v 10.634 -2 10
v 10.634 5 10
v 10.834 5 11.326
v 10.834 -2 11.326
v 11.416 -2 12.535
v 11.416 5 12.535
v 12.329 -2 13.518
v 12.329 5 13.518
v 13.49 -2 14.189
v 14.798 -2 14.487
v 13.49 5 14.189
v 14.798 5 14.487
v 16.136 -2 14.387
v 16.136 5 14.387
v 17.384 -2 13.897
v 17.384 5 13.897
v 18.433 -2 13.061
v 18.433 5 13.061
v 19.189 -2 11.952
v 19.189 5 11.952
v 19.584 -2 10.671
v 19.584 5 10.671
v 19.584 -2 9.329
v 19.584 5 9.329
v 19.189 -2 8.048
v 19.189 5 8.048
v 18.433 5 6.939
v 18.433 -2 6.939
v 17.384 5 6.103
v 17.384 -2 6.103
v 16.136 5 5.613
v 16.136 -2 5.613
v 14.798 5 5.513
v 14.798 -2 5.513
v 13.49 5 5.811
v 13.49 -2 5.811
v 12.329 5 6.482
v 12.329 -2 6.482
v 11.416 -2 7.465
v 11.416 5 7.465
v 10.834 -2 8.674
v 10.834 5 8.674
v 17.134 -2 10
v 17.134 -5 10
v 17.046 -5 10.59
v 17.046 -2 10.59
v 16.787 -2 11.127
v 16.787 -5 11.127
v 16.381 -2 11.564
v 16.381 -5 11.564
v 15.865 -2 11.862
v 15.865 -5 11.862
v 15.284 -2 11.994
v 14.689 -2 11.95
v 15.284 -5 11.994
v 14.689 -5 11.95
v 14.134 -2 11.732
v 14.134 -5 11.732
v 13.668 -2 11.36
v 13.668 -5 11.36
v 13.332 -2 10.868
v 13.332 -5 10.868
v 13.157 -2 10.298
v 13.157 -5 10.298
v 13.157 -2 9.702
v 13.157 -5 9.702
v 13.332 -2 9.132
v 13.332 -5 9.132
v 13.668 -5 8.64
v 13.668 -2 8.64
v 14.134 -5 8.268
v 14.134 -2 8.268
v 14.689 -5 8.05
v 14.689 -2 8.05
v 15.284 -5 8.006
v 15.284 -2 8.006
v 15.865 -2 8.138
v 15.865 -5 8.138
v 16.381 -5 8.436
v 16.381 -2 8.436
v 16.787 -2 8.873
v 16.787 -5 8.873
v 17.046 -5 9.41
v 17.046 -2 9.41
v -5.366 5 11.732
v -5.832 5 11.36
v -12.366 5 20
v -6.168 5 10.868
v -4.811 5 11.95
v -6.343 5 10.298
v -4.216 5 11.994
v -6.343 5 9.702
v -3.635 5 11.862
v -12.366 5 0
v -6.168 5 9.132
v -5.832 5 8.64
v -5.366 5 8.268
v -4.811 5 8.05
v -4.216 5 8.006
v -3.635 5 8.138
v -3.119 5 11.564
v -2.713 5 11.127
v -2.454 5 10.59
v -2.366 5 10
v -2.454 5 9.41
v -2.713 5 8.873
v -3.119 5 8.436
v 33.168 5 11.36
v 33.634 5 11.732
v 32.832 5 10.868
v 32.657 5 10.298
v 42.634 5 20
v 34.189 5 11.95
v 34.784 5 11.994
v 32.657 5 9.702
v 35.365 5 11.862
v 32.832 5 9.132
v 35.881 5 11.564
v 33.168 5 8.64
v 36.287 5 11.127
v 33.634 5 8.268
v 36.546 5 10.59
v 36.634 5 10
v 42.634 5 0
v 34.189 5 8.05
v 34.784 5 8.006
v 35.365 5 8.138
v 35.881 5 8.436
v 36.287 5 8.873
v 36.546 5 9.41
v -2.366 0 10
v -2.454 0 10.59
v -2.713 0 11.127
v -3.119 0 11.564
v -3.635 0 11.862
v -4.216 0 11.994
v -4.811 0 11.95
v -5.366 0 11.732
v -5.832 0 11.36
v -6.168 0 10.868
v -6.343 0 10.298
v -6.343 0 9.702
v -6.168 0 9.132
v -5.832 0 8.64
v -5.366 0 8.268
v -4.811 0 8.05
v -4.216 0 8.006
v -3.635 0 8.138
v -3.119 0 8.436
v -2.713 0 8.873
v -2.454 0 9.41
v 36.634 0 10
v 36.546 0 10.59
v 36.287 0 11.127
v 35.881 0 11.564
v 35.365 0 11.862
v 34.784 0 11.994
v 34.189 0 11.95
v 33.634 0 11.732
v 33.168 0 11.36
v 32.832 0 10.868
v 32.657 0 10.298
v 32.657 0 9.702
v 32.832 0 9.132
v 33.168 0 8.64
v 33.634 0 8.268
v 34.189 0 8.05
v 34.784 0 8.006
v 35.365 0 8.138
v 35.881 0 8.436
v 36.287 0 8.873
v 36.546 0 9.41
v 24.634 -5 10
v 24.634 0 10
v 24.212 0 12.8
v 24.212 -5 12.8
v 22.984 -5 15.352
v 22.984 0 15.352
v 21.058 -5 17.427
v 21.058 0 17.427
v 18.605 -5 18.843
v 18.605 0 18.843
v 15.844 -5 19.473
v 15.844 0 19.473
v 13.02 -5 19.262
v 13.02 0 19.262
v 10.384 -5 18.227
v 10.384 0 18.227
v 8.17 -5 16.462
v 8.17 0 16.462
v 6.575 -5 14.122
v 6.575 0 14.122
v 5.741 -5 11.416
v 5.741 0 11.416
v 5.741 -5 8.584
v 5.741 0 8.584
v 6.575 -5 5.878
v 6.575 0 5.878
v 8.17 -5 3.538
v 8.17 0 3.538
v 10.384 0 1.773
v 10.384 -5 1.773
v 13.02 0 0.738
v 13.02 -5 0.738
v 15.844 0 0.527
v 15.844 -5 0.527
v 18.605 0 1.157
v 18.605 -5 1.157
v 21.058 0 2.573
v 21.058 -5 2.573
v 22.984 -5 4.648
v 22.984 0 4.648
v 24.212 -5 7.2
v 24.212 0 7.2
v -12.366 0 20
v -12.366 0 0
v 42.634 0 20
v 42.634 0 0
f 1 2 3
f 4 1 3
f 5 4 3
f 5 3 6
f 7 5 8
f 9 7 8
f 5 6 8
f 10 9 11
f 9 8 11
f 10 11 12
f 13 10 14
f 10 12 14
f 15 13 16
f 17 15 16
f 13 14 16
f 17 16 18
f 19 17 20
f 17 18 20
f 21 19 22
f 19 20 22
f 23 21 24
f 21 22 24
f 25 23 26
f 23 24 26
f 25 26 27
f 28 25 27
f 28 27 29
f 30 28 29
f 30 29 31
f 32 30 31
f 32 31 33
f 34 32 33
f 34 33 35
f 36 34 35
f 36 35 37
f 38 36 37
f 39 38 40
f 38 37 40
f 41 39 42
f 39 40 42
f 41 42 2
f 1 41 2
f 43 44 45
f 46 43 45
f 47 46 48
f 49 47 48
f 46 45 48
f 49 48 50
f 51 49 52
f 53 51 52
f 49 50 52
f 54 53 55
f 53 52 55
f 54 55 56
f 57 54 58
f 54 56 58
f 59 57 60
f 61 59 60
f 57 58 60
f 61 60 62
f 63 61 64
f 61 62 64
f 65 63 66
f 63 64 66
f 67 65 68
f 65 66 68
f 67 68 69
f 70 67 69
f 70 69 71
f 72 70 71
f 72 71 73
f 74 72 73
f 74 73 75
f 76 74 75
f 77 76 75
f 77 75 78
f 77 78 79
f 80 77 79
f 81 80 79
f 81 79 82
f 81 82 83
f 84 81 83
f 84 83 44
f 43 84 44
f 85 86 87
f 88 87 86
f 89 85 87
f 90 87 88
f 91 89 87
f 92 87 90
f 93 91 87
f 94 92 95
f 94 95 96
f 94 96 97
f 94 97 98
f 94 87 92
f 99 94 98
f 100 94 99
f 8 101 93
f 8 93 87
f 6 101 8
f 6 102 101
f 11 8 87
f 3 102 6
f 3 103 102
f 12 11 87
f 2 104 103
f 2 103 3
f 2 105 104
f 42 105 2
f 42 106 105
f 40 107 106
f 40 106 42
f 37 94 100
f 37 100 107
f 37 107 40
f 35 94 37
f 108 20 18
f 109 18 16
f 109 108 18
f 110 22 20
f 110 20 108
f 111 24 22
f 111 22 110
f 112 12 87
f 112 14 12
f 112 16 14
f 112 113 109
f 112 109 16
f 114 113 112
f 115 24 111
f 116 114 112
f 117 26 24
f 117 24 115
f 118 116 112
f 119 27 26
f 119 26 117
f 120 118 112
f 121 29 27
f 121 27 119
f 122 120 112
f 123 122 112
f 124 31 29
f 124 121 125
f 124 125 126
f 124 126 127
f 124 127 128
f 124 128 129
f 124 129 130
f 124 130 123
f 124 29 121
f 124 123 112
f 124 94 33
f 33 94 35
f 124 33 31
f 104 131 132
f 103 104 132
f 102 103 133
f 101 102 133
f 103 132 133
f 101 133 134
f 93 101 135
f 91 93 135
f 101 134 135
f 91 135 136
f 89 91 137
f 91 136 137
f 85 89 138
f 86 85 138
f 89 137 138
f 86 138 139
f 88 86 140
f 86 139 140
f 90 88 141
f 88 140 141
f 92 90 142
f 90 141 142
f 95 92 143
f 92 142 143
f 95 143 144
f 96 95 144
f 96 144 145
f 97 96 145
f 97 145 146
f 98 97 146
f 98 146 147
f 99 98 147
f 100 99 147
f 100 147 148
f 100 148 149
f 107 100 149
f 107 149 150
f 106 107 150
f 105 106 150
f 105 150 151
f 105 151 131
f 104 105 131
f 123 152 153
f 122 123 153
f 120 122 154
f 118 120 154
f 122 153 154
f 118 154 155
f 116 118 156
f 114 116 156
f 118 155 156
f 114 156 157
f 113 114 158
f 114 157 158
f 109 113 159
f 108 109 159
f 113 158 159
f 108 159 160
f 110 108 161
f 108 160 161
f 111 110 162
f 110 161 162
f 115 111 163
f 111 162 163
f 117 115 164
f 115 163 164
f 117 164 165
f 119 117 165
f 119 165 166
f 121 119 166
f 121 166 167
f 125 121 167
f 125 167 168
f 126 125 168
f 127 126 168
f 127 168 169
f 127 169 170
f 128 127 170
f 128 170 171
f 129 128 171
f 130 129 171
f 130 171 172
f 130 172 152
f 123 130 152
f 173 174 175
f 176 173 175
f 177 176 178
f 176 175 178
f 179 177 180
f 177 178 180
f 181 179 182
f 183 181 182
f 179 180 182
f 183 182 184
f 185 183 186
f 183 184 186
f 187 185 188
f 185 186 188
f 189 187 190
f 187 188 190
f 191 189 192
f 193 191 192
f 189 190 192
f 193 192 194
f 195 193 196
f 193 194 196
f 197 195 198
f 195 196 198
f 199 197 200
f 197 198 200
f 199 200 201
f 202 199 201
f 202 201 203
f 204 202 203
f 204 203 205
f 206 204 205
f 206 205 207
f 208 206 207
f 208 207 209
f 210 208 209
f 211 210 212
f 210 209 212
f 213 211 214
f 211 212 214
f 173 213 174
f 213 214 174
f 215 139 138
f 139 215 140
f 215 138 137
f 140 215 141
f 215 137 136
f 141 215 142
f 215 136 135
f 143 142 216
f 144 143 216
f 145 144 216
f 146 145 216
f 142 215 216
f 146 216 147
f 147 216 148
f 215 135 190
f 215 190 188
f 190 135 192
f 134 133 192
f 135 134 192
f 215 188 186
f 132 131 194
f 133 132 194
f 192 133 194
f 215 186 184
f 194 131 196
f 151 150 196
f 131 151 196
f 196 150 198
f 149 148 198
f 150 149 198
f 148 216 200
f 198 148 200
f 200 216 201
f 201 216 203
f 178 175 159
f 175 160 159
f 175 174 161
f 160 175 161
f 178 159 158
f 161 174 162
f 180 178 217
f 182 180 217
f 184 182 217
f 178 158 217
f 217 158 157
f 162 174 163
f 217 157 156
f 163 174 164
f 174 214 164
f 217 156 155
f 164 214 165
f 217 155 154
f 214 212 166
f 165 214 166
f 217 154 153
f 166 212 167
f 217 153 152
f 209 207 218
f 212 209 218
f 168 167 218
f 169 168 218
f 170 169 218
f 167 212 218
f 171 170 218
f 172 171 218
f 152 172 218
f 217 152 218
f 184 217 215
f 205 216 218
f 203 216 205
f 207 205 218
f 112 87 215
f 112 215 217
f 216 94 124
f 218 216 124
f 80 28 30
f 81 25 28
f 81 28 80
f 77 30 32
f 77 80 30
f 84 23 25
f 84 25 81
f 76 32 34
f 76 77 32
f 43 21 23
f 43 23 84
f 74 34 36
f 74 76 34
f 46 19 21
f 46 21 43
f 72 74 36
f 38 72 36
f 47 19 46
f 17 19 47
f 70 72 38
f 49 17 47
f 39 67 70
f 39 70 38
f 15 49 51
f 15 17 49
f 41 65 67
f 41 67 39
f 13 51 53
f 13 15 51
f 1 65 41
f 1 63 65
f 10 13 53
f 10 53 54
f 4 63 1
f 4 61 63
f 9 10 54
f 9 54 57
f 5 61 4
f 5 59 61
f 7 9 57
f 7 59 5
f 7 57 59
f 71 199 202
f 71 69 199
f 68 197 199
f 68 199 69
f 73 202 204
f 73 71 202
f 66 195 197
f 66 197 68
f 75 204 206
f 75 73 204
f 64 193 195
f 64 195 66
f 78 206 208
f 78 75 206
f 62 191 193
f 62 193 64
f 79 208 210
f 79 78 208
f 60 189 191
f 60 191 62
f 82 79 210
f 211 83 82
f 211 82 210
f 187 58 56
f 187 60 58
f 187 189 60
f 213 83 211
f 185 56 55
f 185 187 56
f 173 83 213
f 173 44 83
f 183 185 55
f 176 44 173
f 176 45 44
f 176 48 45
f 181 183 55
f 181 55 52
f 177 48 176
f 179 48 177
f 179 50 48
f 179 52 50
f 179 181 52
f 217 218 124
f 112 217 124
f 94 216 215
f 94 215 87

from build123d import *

# Parameters (mm, degrees)
F0_W     = 55
F0_H     = 5
F1_DEPTH = 20
F2_R     = 9.5
F3_DEPTH = 5
F4_R     = 2
F5_DEPTH = 10.001
F6_R     = 4.5
F7_DEPTH = 7
F8_R     = 2
F9_DEPTH = 25


with BuildPart() as f1:
    # F0 (on Top) → F1 (new body)
    with BuildSketch(Plane.XY):
        with Locations((15.134409, 2.5)):
            Rectangle(F0_W, F0_H)
    extrude(amount=F1_DEPTH)

    # F2 (on face) → F3 (join)
    with BuildSketch(Plane.XZ):
        with Locations((15.134409, 10)):
            Circle(F2_R)
    extrude(amount=F3_DEPTH)

    # F4 (on face) → F5 (cut, through all)
    with BuildSketch(Plane.XZ.offset(5)):
        with Locations((15.134409, 10)):
            Circle(F4_R)
    extrude(amount=-F5_DEPTH, mode=Mode.SUBTRACT)

    # F6 (on face) → F7 (cut)
    with BuildSketch(Plane(origin=(0, 5, 0), x_dir=(-1, 0, 0), z_dir=(0, 1, 0))):
        with Locations((-15.134409, 10)):
            Circle(F6_R)
    extrude(amount=-F7_DEPTH, mode=Mode.SUBTRACT)

    # F8 (on face) → F9 (cut)
    with BuildSketch(Plane.XZ):
        with Locations((-4.365591, 10)):
            Circle(F8_R)
        with Locations((34.634409, 10)):
            Circle(F8_R)
    extrude(amount=-F9_DEPTH, mode=Mode.SUBTRACT)


solid = f1.part
